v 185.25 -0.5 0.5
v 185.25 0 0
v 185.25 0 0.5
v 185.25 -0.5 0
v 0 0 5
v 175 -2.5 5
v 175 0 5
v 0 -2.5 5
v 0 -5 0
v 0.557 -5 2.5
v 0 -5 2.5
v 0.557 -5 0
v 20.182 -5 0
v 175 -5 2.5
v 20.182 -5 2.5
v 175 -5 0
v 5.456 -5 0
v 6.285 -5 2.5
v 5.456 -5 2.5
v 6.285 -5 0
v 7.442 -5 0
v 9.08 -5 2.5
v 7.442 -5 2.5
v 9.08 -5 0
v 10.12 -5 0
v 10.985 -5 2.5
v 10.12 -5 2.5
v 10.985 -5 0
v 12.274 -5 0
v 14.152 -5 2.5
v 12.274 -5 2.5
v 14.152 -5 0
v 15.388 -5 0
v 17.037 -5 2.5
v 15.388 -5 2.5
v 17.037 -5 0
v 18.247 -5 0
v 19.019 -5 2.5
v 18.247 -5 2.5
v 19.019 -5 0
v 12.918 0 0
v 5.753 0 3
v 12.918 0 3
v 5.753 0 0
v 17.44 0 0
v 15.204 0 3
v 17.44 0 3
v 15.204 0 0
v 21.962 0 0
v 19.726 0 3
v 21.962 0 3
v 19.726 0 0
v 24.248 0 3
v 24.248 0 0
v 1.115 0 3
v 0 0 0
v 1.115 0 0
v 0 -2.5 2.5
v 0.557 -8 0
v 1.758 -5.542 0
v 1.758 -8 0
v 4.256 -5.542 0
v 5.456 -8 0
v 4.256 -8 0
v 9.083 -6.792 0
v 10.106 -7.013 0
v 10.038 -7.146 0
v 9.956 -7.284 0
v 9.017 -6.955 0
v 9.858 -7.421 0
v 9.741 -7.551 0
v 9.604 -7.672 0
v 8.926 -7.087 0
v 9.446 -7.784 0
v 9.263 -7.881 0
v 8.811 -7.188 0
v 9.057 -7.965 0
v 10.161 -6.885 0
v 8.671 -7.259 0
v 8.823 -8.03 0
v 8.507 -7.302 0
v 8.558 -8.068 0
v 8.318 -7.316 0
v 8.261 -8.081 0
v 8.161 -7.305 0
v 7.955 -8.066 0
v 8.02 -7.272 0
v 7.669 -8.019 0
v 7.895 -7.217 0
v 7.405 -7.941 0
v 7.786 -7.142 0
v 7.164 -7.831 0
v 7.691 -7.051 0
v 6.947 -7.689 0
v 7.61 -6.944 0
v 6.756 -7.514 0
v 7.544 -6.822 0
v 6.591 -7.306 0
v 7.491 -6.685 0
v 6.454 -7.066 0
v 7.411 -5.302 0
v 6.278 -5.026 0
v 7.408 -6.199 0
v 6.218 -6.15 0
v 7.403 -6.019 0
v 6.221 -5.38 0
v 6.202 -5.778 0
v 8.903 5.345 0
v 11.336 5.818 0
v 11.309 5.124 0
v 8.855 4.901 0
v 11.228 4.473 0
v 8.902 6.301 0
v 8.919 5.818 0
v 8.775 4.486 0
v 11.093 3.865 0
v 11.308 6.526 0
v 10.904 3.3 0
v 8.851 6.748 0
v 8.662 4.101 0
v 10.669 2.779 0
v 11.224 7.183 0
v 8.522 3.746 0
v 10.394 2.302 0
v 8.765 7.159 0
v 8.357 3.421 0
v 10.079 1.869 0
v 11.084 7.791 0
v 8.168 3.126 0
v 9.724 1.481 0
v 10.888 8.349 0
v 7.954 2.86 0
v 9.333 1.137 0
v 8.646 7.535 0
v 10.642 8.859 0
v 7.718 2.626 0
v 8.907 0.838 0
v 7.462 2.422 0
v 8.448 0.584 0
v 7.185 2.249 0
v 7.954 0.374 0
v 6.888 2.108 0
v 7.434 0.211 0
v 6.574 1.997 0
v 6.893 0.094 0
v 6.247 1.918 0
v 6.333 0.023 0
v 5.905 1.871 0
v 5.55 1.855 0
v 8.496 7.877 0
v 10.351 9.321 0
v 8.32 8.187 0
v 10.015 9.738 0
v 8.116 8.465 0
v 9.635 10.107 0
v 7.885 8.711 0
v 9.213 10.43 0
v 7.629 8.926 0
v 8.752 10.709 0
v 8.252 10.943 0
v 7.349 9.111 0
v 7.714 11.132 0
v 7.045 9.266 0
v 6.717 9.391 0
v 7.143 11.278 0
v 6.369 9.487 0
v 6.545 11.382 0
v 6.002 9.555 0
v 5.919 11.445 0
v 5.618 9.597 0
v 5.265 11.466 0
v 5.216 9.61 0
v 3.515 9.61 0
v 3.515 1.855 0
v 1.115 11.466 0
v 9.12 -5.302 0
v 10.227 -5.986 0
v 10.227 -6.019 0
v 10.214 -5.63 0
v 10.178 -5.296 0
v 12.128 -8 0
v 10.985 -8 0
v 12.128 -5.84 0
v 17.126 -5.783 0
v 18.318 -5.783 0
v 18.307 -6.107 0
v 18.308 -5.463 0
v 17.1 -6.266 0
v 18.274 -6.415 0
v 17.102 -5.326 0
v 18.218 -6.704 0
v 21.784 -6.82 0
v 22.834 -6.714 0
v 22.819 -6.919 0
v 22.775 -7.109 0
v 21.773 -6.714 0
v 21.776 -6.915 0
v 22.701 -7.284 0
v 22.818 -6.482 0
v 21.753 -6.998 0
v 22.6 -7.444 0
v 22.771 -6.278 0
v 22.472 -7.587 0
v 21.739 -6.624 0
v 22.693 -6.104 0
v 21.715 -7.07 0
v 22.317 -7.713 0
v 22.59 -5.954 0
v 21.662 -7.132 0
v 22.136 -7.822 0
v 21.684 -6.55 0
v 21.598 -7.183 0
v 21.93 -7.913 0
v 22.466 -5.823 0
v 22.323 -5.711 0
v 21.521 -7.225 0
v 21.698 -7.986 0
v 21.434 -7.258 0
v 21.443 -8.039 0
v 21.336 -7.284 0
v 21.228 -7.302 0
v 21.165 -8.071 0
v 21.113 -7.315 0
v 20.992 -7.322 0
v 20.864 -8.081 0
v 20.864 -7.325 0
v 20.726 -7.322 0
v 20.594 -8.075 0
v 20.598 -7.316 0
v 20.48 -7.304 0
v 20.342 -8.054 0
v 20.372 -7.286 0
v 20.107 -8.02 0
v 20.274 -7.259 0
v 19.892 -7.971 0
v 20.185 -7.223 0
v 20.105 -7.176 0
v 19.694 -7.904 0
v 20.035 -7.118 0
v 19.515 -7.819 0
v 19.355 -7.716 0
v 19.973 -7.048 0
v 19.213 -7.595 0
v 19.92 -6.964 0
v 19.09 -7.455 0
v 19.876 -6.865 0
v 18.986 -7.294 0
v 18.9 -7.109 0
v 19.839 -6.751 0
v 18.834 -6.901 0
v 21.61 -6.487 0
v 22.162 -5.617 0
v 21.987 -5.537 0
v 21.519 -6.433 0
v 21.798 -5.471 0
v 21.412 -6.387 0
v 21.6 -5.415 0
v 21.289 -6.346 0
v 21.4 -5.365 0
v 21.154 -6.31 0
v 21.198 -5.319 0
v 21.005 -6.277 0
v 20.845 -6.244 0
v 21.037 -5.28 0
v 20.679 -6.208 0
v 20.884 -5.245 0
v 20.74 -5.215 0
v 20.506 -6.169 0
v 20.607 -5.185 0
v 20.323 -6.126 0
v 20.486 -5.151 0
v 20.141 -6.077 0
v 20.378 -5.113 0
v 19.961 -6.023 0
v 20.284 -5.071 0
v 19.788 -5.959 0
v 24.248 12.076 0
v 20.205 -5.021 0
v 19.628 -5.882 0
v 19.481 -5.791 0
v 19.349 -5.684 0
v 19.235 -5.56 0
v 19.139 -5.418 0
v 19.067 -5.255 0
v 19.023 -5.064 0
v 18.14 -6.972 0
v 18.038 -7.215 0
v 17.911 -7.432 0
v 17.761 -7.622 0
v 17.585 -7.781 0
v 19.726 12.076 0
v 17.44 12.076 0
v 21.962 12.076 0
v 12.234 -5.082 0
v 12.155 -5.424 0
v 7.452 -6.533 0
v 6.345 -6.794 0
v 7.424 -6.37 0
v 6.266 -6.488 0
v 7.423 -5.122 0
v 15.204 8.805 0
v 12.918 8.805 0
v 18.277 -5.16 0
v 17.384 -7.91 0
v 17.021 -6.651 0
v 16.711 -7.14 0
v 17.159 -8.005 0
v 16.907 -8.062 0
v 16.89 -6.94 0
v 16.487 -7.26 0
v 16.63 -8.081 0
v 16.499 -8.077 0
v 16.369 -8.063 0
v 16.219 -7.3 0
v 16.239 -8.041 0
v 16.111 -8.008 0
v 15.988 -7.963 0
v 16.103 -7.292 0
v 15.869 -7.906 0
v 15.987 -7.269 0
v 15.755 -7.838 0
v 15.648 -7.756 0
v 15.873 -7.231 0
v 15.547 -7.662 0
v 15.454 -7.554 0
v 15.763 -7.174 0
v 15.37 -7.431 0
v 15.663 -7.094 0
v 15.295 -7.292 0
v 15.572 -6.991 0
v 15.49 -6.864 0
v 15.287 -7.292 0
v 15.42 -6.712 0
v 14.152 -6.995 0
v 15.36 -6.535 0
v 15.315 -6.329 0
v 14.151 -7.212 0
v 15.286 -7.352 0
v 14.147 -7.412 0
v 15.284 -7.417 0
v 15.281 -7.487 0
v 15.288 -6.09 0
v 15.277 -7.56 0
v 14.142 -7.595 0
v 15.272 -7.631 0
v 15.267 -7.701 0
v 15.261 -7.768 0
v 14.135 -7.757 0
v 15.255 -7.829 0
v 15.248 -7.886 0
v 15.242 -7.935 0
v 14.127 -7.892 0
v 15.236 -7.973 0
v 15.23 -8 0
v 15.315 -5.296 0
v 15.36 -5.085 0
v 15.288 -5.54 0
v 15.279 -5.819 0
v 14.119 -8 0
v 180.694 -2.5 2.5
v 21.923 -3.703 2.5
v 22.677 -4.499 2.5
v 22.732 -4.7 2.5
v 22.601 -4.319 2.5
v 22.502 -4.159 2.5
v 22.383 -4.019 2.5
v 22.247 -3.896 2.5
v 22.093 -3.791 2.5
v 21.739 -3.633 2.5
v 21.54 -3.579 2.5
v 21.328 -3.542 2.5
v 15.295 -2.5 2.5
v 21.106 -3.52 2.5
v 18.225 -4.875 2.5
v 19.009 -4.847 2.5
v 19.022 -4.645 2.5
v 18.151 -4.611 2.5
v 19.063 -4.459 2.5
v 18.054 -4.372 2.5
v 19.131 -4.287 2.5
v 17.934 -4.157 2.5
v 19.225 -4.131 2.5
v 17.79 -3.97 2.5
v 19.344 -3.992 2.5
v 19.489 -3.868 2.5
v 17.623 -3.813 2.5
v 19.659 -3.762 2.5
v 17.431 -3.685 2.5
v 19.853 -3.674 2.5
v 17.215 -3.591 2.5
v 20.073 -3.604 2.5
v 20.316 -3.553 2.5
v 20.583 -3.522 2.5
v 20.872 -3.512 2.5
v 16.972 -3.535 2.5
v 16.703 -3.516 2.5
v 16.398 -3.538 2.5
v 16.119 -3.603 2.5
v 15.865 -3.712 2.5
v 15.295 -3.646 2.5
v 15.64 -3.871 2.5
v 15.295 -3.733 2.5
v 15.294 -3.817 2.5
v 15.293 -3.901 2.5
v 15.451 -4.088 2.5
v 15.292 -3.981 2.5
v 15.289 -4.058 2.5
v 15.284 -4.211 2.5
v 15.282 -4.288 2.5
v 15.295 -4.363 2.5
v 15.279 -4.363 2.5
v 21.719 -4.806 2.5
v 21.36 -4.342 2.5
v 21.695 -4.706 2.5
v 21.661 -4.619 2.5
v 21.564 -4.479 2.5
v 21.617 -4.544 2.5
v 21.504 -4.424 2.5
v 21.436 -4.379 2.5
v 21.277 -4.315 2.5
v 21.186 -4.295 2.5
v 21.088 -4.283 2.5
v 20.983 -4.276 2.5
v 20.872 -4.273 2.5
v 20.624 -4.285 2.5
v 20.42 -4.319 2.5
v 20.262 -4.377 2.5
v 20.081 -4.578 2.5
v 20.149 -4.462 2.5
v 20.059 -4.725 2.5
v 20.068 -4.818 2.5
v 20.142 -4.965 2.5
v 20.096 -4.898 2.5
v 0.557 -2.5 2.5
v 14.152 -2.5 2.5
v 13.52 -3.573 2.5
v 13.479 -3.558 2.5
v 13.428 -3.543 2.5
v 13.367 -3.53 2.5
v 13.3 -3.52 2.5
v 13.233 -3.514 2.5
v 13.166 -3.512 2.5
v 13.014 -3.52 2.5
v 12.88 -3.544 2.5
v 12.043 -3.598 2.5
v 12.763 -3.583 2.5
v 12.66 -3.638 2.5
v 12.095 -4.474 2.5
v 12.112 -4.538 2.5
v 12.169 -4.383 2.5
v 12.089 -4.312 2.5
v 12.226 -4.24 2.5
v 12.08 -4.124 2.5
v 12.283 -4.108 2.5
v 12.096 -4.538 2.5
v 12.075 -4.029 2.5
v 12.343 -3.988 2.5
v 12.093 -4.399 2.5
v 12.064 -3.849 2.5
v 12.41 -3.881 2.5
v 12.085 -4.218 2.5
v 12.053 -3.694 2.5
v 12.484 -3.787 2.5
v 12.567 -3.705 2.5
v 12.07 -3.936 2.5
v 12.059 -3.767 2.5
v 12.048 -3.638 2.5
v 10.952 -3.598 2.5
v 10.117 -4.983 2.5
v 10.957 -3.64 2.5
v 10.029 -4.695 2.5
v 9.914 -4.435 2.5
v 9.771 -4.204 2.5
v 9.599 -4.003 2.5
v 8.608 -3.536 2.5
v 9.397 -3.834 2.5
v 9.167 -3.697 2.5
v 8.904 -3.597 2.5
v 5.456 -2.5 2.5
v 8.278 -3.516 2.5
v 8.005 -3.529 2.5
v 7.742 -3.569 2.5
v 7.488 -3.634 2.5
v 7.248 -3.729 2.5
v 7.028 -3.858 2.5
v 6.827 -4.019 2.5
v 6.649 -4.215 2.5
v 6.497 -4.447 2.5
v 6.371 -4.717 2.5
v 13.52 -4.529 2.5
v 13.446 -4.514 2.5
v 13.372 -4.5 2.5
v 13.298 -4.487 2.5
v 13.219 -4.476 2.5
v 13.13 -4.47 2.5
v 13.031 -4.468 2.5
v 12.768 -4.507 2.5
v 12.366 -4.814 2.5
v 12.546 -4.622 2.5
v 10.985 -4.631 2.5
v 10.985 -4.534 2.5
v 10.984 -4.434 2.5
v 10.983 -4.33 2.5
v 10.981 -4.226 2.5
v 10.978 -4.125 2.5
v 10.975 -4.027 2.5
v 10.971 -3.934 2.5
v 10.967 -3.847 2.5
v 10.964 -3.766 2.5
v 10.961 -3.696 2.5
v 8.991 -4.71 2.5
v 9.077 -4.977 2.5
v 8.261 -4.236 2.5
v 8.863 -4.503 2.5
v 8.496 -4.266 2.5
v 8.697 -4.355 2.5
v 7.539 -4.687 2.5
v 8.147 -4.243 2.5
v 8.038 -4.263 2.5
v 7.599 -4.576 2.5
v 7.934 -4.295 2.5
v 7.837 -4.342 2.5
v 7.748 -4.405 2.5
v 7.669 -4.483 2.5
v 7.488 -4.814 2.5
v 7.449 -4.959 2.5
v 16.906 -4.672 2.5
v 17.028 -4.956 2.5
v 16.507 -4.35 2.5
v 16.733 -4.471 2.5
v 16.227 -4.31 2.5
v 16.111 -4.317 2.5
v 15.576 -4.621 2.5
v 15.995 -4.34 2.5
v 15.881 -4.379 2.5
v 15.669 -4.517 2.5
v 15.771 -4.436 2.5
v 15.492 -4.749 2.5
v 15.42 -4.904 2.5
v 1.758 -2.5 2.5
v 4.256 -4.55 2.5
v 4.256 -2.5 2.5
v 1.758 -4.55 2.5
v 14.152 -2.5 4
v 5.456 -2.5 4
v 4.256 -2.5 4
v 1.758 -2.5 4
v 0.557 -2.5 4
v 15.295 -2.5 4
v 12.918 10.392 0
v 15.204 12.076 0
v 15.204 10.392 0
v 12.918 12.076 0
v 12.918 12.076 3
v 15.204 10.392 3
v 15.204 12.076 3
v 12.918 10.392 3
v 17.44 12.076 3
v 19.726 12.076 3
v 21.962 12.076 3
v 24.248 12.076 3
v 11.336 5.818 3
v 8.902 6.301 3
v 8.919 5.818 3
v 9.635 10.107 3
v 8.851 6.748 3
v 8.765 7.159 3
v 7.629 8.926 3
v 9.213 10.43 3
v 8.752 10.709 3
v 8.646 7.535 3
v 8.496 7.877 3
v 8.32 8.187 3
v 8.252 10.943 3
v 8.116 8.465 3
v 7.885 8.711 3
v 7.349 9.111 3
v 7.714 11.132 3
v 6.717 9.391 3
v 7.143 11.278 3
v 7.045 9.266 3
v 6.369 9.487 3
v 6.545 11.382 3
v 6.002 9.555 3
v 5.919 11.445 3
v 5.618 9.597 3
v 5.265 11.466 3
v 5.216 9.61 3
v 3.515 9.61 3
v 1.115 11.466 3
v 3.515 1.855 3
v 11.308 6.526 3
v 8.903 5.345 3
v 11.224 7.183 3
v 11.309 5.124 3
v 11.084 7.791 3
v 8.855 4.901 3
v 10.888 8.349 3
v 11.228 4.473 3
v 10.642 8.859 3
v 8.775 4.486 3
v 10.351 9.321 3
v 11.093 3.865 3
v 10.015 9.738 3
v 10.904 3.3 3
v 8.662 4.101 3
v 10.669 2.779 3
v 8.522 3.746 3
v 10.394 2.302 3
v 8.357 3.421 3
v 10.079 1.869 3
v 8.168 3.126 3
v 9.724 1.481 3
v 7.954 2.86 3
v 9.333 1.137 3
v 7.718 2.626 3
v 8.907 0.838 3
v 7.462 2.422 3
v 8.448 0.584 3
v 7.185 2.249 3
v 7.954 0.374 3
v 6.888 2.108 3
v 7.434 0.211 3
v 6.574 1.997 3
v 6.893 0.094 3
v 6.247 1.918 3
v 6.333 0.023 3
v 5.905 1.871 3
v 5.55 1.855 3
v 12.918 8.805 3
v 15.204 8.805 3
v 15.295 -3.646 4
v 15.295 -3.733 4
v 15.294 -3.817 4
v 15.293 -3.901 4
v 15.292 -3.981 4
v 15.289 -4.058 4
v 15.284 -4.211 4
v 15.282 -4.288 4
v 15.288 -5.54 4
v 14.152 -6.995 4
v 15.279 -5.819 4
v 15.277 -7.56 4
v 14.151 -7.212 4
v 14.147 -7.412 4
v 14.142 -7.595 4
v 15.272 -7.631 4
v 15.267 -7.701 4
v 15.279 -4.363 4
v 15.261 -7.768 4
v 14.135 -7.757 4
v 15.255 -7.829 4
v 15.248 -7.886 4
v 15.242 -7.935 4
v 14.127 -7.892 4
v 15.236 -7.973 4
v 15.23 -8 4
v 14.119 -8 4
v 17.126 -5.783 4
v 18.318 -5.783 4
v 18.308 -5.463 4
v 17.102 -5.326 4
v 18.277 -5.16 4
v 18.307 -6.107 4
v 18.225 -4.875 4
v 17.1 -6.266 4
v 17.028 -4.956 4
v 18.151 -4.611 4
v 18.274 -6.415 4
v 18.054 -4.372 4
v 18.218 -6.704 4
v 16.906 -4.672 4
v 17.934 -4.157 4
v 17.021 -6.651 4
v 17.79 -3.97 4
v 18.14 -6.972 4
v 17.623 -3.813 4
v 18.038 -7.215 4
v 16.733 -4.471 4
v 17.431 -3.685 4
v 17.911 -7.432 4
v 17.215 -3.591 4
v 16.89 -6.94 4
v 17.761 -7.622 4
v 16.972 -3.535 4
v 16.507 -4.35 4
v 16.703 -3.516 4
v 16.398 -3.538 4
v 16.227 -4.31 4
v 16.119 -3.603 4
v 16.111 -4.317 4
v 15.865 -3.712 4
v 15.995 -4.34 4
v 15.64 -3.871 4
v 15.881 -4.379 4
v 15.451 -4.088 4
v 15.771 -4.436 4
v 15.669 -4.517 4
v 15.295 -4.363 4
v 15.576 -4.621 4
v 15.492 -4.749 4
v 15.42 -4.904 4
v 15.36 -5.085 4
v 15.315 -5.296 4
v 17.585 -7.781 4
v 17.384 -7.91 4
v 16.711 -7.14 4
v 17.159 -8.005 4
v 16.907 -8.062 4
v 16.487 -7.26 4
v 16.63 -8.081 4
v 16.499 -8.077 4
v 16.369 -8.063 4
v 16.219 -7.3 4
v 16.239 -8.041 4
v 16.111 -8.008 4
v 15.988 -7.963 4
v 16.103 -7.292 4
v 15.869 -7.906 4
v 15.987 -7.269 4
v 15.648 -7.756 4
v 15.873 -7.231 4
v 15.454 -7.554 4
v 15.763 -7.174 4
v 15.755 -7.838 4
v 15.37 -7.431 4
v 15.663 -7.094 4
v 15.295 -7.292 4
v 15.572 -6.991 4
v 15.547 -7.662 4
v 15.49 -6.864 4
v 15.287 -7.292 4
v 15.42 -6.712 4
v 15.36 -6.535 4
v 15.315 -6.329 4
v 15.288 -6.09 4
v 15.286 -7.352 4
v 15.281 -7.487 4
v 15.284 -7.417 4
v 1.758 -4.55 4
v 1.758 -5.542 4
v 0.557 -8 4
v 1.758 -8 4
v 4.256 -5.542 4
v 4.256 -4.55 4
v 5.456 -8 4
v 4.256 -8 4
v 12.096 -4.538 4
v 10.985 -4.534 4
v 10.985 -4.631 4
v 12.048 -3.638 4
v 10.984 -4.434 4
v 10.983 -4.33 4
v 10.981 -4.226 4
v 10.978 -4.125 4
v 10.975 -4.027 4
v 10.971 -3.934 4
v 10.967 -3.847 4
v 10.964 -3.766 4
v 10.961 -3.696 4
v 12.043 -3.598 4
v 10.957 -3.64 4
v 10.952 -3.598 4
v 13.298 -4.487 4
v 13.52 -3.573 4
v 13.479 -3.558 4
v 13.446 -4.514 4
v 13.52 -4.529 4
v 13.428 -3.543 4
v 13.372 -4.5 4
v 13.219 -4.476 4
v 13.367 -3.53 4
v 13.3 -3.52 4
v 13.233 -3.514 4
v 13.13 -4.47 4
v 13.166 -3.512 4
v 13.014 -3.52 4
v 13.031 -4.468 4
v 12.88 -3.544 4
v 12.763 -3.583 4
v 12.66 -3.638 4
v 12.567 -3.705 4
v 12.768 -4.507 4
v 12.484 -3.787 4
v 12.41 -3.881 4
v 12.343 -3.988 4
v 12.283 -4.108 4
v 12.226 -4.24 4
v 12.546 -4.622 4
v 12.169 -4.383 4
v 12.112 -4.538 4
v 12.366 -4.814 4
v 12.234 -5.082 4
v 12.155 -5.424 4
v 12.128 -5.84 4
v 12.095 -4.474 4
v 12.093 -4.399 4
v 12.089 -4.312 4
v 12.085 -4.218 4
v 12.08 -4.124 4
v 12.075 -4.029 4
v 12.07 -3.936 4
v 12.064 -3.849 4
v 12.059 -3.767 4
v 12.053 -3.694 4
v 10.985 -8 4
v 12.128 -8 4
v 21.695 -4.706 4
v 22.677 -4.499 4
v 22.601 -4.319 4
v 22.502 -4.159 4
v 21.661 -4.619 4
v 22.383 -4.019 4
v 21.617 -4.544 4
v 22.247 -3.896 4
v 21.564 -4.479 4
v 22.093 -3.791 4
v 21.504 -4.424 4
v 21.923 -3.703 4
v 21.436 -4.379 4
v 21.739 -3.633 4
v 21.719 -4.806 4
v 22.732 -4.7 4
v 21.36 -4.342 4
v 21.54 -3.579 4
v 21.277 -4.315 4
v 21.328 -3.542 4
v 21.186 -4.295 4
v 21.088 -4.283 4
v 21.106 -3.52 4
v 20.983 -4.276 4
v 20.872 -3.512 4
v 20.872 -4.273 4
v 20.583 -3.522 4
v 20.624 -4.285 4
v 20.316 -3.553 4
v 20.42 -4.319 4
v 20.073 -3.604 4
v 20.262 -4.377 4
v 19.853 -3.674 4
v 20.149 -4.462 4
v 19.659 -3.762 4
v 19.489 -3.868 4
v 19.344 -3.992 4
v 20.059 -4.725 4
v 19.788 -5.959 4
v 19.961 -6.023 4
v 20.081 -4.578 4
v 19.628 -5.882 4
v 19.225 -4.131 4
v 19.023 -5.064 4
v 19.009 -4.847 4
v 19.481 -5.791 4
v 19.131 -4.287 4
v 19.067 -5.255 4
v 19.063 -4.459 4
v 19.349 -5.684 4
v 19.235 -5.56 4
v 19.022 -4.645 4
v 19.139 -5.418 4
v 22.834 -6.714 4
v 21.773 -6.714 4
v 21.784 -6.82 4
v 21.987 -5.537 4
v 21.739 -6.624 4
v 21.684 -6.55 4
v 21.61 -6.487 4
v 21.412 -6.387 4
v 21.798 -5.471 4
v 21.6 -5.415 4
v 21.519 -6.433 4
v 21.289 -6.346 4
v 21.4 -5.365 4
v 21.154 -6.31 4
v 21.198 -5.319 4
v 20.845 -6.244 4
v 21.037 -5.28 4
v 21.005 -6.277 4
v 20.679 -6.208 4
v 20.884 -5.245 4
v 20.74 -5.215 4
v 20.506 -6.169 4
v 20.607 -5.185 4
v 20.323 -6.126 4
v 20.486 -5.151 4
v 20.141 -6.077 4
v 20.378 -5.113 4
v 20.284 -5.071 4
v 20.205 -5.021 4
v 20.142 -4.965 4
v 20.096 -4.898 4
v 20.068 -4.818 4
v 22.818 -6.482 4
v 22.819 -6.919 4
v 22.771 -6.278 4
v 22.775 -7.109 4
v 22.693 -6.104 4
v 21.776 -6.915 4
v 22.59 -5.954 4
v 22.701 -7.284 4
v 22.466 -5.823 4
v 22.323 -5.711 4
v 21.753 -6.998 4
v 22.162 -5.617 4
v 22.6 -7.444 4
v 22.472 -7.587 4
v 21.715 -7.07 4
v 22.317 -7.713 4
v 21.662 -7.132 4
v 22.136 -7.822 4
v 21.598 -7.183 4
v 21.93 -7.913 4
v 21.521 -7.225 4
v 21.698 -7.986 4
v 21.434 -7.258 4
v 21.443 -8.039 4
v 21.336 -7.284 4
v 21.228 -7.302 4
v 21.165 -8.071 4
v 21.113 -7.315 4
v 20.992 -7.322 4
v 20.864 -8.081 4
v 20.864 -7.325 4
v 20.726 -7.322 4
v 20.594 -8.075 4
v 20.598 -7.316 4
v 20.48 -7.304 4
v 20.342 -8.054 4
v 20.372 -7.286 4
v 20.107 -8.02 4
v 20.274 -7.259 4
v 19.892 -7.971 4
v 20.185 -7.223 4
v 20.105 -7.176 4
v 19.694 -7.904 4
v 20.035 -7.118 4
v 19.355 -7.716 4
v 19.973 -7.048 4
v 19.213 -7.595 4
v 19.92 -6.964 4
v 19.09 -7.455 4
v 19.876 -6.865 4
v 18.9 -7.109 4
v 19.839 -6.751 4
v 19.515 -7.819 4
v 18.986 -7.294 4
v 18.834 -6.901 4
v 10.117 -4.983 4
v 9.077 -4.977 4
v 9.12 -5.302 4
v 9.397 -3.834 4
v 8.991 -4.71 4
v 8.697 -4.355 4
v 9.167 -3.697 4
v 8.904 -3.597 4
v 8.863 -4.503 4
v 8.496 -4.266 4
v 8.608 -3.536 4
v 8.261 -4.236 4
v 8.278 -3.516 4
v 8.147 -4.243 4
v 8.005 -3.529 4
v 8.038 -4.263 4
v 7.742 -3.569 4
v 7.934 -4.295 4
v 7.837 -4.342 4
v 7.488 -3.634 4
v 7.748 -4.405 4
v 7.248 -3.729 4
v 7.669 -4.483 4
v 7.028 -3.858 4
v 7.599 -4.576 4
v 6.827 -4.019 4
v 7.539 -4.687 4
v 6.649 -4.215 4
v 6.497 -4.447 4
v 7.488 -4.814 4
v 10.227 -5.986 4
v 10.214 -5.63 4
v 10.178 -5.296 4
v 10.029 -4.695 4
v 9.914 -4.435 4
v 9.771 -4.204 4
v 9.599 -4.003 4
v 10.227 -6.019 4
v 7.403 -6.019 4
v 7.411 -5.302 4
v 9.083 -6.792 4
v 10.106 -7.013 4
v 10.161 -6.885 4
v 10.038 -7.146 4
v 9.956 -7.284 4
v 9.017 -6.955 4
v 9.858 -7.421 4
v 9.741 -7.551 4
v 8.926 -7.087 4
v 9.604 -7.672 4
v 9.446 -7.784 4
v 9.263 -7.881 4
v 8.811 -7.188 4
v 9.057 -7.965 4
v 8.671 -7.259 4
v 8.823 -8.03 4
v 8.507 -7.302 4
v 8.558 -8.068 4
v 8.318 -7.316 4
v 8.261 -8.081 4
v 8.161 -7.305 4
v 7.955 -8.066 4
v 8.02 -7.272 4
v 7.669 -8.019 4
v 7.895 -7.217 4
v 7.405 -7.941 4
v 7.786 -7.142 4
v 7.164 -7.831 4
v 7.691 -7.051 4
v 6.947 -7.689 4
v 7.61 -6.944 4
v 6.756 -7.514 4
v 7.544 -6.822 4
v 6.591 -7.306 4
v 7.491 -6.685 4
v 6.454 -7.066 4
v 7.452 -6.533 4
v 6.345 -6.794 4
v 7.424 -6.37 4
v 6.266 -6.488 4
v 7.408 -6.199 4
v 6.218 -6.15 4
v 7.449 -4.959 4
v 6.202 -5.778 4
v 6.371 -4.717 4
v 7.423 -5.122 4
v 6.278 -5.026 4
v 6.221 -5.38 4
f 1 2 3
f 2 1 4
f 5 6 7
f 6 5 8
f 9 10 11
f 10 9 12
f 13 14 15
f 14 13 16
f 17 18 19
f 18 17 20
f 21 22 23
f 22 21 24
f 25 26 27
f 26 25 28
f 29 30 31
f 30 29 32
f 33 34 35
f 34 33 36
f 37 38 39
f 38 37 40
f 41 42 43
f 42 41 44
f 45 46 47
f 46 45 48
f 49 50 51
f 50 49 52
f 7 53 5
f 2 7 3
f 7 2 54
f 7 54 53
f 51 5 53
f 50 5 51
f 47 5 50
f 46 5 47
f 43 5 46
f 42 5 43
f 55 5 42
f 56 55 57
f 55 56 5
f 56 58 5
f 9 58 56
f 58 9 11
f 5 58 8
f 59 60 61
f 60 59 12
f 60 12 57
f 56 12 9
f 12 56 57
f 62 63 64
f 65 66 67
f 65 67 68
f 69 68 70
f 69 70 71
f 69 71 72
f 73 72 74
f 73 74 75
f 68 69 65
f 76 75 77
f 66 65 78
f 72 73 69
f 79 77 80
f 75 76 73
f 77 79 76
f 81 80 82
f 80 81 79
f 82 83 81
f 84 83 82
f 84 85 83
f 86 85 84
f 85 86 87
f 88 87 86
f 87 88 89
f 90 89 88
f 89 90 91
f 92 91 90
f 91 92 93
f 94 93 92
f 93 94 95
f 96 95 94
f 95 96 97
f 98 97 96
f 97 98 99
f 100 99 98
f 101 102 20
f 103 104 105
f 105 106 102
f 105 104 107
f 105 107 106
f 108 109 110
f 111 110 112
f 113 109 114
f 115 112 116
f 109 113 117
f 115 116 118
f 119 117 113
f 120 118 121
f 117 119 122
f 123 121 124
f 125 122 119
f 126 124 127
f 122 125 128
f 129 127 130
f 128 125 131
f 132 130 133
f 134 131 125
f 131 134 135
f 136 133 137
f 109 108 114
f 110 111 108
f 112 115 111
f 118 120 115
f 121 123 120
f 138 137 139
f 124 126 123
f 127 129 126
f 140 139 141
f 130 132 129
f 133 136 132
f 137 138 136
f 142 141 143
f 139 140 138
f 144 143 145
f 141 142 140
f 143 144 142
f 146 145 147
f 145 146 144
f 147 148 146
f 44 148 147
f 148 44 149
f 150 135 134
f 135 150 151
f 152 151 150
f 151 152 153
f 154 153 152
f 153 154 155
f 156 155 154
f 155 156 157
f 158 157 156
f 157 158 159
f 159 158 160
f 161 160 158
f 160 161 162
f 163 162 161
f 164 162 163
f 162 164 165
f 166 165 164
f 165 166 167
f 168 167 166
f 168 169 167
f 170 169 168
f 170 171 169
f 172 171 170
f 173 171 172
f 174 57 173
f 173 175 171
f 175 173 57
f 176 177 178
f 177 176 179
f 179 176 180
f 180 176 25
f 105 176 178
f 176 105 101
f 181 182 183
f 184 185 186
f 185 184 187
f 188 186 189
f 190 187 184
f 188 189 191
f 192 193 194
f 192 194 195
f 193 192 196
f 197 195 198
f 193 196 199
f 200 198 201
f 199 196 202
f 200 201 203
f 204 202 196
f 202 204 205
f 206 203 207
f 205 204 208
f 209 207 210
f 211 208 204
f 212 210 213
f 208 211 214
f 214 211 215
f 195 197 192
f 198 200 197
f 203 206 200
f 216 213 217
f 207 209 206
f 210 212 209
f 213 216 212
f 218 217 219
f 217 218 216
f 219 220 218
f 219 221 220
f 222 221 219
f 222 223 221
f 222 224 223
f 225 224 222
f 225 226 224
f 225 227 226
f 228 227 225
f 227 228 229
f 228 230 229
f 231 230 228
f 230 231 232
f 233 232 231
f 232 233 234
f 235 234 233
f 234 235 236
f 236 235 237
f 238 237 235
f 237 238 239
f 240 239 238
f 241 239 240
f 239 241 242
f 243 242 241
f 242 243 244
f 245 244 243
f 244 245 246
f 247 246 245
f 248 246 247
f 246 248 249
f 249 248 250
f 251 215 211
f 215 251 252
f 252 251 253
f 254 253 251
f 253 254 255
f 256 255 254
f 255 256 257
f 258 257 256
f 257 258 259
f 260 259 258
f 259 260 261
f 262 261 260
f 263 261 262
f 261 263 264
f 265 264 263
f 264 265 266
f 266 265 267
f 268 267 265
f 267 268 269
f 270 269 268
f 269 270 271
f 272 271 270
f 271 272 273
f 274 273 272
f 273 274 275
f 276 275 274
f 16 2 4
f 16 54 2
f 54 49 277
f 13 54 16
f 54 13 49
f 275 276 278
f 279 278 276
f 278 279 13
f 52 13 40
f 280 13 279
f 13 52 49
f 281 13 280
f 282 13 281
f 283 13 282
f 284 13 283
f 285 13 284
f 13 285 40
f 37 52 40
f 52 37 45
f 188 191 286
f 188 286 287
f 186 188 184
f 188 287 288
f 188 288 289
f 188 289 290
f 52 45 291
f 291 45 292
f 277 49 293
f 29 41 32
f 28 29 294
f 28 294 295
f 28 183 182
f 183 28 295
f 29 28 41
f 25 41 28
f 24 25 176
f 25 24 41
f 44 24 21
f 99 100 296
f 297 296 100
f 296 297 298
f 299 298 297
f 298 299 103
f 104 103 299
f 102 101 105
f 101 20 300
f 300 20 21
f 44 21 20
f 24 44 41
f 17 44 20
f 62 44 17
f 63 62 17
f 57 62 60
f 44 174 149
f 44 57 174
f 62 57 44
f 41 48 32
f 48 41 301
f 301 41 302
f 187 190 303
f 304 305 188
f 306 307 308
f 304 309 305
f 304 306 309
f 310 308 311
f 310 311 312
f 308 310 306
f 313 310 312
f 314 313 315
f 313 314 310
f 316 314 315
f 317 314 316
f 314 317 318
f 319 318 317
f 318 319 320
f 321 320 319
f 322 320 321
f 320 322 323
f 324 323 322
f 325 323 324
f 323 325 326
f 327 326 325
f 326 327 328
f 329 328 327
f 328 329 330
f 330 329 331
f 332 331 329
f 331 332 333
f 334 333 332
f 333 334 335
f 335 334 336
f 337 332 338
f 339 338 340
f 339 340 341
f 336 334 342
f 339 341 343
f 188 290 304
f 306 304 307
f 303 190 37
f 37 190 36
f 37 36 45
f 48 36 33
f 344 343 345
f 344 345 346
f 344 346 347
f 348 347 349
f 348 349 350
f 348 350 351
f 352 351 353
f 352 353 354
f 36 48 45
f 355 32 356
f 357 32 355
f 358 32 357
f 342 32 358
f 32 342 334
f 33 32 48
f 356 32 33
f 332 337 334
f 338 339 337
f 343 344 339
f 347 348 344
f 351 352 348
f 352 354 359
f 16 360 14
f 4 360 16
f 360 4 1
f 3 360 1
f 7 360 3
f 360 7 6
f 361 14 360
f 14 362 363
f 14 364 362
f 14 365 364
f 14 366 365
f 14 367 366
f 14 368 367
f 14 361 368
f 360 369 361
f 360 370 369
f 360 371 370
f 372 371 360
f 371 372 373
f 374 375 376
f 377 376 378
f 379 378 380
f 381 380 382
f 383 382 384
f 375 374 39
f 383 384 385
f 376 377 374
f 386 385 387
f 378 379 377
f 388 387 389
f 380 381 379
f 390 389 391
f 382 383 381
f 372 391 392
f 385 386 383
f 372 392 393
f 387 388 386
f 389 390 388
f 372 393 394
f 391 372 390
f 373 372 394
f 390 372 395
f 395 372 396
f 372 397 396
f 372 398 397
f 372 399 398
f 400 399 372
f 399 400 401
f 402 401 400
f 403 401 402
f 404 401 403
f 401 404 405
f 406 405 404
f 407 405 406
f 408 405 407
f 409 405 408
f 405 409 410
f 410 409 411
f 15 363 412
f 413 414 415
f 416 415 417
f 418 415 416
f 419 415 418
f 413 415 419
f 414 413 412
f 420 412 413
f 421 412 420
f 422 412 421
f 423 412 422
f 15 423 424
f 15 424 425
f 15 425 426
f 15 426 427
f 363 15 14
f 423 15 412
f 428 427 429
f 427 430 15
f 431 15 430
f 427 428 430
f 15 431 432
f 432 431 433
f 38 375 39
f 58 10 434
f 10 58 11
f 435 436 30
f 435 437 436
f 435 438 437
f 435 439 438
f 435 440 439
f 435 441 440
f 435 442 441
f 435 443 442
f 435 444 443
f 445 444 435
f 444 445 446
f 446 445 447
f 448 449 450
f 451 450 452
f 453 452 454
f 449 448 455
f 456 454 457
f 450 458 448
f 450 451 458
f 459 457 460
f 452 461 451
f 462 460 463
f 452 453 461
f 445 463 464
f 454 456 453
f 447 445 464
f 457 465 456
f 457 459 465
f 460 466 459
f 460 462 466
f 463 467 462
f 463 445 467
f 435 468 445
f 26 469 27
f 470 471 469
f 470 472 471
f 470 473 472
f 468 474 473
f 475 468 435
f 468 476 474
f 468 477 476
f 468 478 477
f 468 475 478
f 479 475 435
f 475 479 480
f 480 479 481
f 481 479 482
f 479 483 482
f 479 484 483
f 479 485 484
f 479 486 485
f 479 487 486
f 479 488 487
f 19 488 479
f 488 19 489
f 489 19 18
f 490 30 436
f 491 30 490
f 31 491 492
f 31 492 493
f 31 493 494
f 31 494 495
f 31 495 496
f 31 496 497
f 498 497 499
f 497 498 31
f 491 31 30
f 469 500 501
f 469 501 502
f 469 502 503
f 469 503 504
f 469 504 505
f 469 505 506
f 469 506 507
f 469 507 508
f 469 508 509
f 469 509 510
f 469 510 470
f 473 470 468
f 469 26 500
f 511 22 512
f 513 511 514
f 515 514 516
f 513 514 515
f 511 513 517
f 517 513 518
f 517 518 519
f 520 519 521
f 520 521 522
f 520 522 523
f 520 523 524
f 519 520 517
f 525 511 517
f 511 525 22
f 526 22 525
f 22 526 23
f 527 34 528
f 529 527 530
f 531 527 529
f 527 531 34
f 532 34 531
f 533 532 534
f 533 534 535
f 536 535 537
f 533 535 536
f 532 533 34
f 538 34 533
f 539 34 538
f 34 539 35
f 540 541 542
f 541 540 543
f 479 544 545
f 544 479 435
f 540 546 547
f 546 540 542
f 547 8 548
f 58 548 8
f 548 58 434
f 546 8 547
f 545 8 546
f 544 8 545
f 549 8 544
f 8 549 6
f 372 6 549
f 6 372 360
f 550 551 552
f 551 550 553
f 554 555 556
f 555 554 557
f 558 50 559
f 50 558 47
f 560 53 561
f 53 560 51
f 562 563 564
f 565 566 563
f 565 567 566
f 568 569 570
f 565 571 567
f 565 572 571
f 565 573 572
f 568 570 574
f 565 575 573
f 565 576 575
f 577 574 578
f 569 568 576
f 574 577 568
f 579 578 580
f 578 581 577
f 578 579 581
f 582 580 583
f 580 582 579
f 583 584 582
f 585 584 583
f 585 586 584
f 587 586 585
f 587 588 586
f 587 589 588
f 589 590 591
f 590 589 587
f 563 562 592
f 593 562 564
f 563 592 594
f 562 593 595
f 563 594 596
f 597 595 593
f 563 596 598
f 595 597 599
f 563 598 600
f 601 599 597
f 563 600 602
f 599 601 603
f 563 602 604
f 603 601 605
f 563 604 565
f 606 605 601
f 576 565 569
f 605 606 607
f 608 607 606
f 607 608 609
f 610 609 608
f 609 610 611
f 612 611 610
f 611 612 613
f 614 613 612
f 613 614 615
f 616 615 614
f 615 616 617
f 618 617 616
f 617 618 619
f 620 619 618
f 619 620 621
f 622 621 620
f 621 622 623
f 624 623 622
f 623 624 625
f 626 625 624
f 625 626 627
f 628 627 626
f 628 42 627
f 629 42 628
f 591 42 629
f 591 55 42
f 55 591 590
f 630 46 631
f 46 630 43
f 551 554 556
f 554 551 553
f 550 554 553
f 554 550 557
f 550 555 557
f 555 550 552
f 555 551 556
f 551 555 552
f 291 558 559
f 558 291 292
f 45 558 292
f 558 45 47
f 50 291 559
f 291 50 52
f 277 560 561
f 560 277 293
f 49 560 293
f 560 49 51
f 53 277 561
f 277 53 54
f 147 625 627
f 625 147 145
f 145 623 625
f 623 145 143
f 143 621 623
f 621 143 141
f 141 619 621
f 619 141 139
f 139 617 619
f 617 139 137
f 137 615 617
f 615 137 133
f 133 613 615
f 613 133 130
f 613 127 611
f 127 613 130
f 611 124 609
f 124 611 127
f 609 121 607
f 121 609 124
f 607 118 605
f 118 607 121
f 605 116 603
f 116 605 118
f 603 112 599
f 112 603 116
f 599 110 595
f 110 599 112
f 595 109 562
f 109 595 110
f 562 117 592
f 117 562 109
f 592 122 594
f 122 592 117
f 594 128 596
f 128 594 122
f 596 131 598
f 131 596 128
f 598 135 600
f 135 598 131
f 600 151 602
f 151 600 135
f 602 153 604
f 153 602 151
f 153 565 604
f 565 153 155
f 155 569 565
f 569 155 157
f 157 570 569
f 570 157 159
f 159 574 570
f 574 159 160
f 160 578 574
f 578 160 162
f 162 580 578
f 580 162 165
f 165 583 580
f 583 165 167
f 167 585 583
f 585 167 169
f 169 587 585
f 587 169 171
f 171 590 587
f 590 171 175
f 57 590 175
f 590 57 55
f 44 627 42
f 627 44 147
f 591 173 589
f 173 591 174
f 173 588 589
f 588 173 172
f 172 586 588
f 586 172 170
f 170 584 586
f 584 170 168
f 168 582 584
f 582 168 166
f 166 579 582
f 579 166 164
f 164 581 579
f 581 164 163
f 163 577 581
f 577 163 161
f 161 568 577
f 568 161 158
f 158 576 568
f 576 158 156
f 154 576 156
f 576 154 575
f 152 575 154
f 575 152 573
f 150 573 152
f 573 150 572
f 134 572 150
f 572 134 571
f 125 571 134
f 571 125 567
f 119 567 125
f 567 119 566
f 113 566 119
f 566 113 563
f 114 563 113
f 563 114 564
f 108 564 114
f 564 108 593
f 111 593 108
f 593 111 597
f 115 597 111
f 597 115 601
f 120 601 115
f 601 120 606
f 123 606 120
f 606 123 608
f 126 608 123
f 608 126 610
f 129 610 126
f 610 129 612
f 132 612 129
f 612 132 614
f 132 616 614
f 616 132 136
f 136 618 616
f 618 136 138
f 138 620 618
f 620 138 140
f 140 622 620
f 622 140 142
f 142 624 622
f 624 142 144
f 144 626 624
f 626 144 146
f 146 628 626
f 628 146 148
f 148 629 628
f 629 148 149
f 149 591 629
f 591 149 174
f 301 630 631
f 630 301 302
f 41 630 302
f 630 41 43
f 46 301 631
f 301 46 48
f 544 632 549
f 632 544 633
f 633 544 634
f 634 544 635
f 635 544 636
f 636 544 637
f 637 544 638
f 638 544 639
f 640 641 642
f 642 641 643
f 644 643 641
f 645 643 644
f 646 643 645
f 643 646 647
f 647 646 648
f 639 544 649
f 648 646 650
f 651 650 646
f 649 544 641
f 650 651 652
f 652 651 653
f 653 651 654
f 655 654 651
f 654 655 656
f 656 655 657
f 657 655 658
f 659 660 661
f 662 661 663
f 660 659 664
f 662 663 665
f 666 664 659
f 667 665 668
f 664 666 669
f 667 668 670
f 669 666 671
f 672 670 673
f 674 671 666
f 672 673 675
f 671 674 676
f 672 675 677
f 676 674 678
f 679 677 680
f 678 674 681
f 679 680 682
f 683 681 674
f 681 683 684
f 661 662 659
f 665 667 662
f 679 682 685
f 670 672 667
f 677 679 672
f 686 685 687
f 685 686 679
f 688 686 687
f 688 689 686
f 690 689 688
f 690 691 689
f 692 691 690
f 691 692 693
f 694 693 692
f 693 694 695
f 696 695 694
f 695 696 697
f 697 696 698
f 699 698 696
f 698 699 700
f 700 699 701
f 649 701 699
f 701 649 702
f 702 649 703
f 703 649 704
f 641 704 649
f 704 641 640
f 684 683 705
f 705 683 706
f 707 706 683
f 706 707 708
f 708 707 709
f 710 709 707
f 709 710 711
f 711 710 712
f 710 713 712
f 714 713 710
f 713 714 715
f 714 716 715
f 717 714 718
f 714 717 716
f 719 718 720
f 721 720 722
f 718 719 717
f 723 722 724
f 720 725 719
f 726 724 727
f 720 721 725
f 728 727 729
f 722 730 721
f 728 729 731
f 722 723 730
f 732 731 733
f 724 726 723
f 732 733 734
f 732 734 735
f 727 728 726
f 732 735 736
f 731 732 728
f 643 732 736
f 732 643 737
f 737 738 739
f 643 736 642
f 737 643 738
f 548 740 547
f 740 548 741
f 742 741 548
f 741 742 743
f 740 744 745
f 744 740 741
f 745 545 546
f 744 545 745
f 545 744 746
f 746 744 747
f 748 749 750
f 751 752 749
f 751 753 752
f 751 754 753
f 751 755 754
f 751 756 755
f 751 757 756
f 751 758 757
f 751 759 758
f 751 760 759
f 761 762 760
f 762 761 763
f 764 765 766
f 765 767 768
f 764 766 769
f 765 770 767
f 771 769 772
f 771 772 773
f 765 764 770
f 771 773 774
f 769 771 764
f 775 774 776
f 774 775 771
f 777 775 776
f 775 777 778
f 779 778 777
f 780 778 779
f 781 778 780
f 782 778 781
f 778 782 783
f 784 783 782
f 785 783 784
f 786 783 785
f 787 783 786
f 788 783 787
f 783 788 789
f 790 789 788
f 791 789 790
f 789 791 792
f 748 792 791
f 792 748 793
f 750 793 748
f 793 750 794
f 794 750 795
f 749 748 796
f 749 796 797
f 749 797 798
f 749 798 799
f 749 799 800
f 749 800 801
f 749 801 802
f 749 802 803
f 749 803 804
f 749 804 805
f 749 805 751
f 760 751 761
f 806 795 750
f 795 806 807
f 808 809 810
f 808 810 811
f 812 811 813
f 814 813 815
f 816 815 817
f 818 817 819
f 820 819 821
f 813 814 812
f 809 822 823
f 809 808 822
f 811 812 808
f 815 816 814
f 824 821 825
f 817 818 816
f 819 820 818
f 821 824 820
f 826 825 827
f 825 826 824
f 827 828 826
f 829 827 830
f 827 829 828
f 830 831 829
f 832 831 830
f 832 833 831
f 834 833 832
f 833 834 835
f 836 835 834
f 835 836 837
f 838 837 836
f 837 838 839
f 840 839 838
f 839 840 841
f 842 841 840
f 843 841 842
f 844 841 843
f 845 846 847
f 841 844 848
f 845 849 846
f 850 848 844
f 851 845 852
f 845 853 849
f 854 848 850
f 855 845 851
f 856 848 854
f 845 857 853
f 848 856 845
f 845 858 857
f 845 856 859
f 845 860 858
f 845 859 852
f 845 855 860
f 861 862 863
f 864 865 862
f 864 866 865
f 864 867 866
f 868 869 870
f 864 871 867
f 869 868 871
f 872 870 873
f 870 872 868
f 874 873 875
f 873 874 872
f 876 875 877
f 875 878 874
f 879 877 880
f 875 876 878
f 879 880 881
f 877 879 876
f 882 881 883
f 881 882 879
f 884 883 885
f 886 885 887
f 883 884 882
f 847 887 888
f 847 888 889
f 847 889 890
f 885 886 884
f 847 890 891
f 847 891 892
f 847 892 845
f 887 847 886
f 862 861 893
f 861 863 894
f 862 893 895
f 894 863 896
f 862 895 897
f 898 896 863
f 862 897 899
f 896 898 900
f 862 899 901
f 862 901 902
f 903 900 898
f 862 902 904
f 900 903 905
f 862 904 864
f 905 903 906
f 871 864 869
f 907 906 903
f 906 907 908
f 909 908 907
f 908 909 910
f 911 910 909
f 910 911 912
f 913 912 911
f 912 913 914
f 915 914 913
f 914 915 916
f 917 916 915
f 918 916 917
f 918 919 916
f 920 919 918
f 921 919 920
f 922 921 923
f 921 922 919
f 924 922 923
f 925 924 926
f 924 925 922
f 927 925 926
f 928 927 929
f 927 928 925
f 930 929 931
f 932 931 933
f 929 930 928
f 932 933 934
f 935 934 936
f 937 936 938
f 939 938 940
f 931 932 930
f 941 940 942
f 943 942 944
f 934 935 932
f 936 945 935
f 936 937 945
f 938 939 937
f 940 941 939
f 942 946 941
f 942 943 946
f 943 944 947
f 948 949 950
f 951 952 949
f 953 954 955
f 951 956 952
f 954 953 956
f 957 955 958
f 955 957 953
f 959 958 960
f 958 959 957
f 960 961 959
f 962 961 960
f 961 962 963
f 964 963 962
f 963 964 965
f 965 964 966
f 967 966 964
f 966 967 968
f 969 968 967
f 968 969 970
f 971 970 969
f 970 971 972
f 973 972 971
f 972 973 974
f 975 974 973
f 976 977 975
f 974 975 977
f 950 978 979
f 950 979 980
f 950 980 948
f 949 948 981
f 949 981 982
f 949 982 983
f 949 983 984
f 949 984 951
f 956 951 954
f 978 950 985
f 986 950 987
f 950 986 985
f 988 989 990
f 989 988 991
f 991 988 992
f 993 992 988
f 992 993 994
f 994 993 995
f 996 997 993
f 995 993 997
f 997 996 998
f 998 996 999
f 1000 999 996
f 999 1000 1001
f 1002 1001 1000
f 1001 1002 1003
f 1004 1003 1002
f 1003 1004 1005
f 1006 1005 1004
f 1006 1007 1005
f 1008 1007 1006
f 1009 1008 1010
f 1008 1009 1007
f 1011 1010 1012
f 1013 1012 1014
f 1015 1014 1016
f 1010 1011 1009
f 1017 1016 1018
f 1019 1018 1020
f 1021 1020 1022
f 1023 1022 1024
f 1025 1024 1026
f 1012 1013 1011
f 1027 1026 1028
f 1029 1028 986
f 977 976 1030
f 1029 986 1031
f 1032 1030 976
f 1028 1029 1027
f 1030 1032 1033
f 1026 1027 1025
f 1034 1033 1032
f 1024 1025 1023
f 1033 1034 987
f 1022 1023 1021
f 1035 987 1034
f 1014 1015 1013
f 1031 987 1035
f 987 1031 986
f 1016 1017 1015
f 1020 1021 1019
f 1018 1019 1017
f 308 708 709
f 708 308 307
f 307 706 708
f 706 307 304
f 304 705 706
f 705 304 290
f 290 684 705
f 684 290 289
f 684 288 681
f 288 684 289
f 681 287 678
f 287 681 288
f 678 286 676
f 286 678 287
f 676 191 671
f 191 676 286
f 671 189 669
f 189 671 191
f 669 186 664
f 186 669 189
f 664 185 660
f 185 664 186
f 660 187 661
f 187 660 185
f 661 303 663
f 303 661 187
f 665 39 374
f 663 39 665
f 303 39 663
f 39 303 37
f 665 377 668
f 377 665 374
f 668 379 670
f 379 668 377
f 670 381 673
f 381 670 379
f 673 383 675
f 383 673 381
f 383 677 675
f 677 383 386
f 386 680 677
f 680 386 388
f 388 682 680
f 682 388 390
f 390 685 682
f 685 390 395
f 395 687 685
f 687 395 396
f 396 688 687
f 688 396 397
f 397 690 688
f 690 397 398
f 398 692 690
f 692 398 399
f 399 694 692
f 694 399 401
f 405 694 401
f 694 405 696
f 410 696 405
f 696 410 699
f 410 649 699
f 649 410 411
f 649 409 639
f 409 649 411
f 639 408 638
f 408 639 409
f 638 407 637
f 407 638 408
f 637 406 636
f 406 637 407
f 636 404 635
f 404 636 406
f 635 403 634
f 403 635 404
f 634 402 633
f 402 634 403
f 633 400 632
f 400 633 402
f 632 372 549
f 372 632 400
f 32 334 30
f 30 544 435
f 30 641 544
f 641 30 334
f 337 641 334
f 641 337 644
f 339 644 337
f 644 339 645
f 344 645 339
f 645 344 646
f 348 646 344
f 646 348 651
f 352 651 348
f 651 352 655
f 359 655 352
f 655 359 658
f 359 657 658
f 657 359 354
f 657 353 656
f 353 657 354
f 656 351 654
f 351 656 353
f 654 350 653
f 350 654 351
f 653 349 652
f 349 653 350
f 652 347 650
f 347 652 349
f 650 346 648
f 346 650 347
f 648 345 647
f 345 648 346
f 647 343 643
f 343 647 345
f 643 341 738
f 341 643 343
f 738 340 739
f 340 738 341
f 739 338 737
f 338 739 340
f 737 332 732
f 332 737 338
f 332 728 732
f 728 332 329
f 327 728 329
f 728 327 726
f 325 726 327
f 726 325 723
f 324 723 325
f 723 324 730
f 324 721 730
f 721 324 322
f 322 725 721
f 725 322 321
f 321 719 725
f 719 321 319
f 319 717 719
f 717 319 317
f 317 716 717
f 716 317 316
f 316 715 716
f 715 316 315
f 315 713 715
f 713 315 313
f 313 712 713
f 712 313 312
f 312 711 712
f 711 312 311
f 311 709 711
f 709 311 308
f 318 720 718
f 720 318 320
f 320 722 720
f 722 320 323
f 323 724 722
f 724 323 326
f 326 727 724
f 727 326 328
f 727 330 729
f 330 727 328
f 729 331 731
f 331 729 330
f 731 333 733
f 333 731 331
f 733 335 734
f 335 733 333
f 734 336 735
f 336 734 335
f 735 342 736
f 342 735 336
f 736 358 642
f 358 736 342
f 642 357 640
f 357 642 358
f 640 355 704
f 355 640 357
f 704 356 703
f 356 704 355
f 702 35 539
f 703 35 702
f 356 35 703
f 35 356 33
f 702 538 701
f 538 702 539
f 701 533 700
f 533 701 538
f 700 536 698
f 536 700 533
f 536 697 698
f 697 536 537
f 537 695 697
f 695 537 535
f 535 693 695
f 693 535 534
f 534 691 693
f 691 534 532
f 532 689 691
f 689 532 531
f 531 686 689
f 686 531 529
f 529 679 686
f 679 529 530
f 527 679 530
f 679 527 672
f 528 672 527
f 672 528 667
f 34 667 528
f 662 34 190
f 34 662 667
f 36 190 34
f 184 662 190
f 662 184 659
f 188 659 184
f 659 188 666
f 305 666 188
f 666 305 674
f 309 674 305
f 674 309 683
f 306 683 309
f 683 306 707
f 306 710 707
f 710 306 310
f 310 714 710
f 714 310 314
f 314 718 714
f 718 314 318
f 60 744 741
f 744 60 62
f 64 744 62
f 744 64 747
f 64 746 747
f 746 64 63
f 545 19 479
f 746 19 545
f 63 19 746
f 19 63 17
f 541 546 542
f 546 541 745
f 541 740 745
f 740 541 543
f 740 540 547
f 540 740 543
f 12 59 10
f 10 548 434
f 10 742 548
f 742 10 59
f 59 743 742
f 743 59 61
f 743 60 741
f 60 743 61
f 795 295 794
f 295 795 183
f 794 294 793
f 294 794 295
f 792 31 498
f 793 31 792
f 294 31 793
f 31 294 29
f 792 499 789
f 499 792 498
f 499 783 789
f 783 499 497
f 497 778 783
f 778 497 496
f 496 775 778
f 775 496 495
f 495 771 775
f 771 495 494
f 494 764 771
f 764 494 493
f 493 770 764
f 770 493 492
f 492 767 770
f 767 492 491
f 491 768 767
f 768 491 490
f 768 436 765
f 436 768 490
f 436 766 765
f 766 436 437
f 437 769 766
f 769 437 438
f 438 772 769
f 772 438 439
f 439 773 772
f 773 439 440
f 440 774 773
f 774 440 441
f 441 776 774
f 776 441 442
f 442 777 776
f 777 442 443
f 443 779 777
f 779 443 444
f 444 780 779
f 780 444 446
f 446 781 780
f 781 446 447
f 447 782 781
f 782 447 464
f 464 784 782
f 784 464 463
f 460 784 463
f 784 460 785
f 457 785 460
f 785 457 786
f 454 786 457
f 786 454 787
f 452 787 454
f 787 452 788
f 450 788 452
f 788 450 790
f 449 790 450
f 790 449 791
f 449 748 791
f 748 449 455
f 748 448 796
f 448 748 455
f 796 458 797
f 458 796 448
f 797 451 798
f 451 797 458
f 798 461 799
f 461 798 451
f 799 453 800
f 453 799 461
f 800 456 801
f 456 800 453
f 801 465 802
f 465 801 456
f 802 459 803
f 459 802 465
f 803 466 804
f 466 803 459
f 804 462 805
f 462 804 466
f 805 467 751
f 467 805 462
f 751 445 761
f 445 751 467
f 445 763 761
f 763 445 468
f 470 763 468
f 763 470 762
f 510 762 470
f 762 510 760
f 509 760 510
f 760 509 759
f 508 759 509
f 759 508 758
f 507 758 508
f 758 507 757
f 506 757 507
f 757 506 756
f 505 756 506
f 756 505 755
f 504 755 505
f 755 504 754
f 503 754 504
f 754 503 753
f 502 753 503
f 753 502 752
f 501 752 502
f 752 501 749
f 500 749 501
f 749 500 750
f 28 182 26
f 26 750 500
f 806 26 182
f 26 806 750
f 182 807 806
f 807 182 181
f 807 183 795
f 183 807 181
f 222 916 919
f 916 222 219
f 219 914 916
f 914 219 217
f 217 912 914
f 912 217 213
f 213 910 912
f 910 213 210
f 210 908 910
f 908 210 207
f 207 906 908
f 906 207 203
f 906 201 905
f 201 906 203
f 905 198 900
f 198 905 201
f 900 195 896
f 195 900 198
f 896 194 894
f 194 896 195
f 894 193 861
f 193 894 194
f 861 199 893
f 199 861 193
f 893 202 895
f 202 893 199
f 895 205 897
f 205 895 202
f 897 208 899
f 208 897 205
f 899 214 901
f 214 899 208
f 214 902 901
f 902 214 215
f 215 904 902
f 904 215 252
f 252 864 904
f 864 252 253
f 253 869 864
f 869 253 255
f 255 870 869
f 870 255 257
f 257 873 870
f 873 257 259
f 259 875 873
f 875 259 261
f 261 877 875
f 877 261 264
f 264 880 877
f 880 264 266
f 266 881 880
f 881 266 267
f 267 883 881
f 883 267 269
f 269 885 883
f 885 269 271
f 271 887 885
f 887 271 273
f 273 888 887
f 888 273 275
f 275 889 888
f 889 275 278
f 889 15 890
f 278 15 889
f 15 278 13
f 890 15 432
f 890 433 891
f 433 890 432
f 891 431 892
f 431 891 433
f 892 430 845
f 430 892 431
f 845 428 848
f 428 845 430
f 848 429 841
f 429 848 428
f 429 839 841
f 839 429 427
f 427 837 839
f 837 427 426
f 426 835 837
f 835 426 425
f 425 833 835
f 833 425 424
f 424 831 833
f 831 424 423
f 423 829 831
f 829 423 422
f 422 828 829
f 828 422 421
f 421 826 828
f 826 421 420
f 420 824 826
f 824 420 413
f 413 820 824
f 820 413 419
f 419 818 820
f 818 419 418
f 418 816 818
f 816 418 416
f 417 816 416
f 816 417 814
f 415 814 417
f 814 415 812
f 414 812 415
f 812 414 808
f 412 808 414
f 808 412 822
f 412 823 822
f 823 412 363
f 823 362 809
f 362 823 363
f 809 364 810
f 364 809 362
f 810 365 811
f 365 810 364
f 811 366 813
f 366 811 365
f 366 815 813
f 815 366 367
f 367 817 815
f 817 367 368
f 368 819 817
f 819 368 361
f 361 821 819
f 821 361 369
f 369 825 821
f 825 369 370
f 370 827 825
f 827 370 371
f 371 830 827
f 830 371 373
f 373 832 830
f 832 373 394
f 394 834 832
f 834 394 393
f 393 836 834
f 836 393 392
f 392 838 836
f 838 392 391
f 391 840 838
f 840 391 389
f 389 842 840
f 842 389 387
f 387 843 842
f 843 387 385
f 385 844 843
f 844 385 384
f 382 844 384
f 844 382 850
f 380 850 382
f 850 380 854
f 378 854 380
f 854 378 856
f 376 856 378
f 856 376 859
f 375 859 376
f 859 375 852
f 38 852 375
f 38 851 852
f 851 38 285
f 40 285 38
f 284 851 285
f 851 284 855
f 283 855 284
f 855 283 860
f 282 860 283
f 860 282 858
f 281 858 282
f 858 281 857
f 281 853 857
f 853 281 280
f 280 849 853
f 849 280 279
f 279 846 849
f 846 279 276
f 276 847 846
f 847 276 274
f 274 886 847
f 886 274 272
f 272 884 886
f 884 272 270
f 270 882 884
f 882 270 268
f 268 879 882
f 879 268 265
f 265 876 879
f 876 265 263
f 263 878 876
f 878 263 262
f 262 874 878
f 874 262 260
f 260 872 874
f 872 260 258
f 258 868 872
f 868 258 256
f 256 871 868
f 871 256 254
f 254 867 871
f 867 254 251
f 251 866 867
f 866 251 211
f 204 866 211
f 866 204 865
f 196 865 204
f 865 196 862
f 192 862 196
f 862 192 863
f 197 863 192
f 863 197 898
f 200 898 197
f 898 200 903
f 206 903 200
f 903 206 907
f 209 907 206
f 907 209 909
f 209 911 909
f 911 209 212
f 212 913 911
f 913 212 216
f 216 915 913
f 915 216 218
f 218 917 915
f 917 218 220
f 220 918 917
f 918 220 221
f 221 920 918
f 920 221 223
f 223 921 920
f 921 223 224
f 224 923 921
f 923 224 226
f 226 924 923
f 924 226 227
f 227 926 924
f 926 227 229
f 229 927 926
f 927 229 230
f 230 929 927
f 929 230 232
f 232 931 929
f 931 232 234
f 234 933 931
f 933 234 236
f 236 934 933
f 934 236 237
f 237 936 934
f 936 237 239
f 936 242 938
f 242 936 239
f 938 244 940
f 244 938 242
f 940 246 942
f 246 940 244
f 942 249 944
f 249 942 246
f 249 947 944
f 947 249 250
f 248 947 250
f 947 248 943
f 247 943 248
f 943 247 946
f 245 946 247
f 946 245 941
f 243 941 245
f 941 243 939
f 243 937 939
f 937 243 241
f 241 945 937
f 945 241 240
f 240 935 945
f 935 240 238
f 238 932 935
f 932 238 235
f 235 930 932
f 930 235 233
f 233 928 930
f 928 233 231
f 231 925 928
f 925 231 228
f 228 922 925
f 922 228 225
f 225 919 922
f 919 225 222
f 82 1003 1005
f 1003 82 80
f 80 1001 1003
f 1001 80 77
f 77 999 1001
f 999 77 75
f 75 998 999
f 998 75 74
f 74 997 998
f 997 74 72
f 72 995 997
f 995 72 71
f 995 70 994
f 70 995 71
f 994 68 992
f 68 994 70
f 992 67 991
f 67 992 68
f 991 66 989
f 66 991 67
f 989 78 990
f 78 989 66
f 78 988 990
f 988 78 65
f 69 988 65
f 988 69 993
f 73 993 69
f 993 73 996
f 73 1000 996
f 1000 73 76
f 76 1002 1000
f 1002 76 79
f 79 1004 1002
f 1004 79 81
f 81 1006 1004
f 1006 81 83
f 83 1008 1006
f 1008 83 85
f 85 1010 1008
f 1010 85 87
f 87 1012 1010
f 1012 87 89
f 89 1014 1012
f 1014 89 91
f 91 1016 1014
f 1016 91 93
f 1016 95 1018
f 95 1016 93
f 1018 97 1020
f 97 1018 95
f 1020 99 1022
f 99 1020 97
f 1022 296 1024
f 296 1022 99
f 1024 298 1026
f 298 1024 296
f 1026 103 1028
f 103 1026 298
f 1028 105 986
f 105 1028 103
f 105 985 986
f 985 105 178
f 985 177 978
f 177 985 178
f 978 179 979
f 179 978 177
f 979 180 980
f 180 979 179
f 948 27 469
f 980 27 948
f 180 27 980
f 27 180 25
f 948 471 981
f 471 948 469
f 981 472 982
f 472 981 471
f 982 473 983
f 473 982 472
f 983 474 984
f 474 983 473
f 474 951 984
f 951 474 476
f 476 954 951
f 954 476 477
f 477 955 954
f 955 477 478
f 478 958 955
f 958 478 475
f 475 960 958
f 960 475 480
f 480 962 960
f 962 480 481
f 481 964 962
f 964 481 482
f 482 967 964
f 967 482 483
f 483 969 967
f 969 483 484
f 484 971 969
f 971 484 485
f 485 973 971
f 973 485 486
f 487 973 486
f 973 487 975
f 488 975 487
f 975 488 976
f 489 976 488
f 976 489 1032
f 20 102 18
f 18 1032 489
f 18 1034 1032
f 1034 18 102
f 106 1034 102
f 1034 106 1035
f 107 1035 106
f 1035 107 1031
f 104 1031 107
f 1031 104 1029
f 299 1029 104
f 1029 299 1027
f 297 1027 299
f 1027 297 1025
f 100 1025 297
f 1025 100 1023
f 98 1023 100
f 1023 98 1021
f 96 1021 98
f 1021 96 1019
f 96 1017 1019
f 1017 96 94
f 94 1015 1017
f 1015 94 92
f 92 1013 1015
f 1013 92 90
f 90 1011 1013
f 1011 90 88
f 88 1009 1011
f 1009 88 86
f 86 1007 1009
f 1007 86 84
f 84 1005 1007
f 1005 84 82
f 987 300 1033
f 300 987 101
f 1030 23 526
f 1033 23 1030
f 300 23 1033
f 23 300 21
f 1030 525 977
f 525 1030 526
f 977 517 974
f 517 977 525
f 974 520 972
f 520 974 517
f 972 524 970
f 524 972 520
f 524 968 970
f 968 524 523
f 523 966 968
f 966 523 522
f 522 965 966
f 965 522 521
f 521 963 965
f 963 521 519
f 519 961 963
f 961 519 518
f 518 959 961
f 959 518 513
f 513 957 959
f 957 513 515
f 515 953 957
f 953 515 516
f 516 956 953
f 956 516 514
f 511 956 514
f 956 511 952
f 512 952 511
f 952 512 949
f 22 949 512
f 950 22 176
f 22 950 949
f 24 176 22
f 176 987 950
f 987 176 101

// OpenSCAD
// Customizable Garden Plant Label Stake
// by Mark Thompson

text_string = "Dill";
text_size = 12;
text_thickness = 3;
text_font = "Nimbus Sans L:Bold";
text_y_offset_adjust = 0;

subtext_string = "Herbs";
subtext_size = 6;
subtext_thickness = 4;
subtext_font = "Nimbus Sans L:Bold";
subtext_y_offset_adjust = -8;

stake_length = 175;
stake_thickness = 5;
stake_height = 5;

point_length = 10;
tip_size = 0.5;

{
    translate([0,text_y_offset_adjust,0])
        linear_extrude(height=text_thickness, convexity=4)
            text(text_string,size=text_size,font=text_font);

    translate([0,subtext_y_offset_adjust,0])
        linear_extrude(height=subtext_thickness, convexity=4)
            text(subtext_string,size=subtext_size,font=subtext_font);

    translate([stake_length/2,-stake_height/2,stake_thickness/2]) {
        difference() {
            hull() {
                cube([stake_length,stake_height,stake_thickness],true);
                translate([stake_length/2+point_length,stake_height/2-tip_size/2,-stake_thickness/2+tip_size/2])
                    cube([tip_size,tip_size,tip_size],true);
            }
            
            translate([0,-stake_height/2,stake_thickness/2])
                cube([stake_length+point_length*2+0.1,stake_height,stake_thickness],true);
        }
    }
}
